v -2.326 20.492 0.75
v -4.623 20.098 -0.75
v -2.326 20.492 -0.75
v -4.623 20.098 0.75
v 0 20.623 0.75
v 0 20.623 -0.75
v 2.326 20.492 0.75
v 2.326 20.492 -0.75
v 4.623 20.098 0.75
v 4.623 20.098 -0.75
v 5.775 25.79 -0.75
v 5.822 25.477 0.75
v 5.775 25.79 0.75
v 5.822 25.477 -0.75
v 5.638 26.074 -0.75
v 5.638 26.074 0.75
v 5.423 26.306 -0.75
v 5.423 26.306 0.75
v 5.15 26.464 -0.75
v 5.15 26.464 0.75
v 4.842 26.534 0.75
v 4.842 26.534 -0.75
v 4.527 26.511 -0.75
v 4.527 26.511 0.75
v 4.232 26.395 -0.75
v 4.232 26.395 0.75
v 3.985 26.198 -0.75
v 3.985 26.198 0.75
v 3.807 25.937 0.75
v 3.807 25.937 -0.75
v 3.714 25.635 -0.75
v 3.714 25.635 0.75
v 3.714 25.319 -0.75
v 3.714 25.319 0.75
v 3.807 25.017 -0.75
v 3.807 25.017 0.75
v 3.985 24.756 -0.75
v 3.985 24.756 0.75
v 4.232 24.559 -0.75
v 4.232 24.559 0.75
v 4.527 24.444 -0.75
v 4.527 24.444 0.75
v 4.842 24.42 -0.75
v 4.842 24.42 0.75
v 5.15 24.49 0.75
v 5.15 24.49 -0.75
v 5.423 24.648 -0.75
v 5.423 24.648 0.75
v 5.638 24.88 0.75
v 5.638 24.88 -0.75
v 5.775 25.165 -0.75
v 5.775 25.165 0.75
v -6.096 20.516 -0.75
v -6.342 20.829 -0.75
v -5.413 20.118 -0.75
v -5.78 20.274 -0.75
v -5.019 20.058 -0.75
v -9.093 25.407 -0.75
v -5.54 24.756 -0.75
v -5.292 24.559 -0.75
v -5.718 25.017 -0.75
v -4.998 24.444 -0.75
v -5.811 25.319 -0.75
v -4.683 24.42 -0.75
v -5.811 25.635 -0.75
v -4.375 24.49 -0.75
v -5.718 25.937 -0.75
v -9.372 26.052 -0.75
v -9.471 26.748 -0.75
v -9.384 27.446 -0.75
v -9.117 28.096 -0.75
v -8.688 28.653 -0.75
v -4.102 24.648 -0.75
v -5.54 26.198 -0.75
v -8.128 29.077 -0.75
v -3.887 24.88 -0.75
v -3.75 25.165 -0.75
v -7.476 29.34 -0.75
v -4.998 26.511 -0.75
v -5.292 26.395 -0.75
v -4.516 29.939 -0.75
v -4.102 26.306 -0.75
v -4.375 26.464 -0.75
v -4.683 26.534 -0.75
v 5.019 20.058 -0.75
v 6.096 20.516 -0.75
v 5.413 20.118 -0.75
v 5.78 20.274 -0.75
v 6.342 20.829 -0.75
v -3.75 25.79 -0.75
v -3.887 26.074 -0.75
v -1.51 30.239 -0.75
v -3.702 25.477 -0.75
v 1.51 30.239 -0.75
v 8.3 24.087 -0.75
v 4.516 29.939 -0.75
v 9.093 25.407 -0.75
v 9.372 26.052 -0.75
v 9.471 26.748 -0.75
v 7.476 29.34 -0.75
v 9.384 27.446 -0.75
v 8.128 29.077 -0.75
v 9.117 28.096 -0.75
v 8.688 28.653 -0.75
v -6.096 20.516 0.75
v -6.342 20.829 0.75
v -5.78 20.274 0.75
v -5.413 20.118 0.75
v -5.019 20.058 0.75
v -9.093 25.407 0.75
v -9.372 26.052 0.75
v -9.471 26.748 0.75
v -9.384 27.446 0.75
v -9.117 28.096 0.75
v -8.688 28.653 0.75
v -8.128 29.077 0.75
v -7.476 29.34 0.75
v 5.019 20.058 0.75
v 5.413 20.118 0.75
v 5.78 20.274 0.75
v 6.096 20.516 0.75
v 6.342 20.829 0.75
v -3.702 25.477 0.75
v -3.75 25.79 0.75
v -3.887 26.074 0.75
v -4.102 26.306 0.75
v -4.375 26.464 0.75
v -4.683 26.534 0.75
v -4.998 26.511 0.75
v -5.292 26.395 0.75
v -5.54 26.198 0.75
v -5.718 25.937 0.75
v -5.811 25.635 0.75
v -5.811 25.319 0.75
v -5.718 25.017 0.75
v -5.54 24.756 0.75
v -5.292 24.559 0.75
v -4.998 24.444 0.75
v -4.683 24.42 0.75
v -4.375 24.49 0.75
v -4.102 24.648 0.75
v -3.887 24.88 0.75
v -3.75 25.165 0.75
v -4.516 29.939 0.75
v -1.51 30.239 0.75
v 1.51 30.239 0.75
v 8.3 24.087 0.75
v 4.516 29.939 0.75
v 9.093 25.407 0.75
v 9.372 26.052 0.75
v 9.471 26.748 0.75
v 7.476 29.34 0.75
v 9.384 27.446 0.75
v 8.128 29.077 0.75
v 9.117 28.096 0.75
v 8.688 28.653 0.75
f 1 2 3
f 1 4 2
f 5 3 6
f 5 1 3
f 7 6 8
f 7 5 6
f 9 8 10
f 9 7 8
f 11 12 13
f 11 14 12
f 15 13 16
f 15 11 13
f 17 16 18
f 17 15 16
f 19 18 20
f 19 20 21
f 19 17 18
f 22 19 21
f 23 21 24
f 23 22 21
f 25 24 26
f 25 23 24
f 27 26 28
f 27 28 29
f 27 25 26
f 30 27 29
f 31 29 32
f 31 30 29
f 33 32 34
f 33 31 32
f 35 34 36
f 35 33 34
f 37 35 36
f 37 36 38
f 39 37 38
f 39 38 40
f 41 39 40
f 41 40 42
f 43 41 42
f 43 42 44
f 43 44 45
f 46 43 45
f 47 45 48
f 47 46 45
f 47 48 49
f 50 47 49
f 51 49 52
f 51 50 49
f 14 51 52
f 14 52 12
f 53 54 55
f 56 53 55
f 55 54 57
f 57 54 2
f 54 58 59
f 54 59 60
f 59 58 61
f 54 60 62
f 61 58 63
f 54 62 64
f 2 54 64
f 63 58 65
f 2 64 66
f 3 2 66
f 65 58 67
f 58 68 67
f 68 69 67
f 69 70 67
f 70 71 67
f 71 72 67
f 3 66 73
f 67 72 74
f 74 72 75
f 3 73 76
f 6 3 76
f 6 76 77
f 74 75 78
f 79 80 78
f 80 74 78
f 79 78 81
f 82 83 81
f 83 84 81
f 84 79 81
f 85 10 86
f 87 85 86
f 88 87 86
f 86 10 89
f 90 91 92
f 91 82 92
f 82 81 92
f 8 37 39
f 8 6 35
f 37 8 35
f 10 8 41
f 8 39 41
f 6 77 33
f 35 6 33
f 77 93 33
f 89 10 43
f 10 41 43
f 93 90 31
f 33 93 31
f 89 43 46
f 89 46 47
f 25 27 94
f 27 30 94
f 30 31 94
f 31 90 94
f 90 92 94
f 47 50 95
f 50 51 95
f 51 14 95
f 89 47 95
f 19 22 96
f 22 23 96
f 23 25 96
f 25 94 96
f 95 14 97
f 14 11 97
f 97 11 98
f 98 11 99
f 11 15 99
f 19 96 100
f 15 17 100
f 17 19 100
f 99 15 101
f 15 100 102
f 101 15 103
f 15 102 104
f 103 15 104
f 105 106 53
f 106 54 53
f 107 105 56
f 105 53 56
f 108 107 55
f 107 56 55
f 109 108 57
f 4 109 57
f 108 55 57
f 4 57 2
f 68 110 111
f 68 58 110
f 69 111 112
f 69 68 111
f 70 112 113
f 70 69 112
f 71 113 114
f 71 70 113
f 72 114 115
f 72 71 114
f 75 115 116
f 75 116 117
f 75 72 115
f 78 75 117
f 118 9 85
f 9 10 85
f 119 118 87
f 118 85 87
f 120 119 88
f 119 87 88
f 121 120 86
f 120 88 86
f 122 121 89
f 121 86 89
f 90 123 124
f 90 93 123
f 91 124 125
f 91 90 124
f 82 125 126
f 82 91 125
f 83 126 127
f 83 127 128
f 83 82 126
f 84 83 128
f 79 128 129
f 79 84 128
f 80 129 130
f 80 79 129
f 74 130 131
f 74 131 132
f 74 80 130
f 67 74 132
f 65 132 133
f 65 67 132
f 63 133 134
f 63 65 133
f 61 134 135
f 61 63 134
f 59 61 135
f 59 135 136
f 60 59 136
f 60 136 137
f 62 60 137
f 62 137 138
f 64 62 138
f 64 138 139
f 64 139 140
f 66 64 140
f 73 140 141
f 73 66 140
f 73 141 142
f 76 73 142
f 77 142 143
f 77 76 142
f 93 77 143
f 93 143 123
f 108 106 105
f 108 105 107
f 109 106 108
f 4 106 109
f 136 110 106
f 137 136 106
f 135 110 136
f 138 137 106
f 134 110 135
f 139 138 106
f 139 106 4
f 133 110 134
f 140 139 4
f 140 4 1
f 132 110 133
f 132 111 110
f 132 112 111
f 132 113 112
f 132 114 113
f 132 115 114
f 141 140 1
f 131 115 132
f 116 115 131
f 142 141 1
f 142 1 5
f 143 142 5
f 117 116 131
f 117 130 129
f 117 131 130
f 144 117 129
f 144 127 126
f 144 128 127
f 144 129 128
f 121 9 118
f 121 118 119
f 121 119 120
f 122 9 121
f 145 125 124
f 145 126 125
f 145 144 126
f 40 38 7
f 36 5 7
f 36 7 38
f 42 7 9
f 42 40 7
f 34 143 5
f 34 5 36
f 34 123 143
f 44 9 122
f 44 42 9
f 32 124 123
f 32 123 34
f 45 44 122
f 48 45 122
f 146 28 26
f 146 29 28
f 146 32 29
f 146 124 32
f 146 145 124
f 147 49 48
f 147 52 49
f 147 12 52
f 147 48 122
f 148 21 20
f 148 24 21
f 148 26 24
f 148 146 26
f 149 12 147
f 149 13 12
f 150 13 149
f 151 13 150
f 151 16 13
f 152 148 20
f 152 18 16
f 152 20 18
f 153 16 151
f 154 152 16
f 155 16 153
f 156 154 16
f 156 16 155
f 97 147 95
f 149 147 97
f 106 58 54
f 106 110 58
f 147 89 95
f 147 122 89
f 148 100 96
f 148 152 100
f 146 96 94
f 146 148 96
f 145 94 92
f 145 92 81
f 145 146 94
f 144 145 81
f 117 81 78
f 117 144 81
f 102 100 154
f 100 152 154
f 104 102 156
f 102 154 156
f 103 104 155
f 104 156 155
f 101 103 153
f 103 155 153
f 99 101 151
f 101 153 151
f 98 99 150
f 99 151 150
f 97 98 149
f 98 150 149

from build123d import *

# Parameters (mm, degrees)
SKETCH_2_R      = 1.06
EXTRUDE_1_DEPTH = 0.75
FILLET_1_R      = 2.65
FILLET_2_R      = 1.59


with BuildPart() as part:
    # 草图2 → 拉伸1 (new, symmetric)
    with BuildSketch(Plane.XY):
        with BuildLine():
            Line((5.730721037, 19.810931144), (8.300141741, 24.087165303))
            Line((8.300141741, 24.087165303), (10.818460752, 28.278351963))
            ThreePointArc((10.818460752, 28.278351963), (0, 30.277124745), (-10.818460752, 28.278351963))
            Line((-10.818460752, 28.278351963), (-5.730721037, 19.810931144))
            ThreePointArc((-5.730721037, 19.810931144), (0, 20.623146132), (5.730721037, 19.810931144))
        make_face()
        with Locations((-4.7625, 25.477124745)):
            Circle(SKETCH_2_R, mode=Mode.SUBTRACT)
        with Locations((4.7625, 25.477124745)):
            Circle(SKETCH_2_R, mode=Mode.SUBTRACT)
    extrude(amount=EXTRUDE_1_DEPTH, both=True)

    # 圆角1
    fillet_1_edges = [part.edges().sort_by_distance(p)[0] for p in [
        (-10.818460752, 28.278351963, 0),
        (10.818460752, 28.278351963, 0),
    ]]
    fillet(fillet_1_edges, radius=FILLET_1_R)

    # 圆角2
    fillet_2_edges = [part.edges().sort_by_distance(p)[0] for p in [
        (-5.730721037, 19.810931144, 0),
        (5.730721037, 19.810931144, 0),
    ]]
    fillet(fillet_2_edges, radius=FILLET_2_R)


solid = part.part
